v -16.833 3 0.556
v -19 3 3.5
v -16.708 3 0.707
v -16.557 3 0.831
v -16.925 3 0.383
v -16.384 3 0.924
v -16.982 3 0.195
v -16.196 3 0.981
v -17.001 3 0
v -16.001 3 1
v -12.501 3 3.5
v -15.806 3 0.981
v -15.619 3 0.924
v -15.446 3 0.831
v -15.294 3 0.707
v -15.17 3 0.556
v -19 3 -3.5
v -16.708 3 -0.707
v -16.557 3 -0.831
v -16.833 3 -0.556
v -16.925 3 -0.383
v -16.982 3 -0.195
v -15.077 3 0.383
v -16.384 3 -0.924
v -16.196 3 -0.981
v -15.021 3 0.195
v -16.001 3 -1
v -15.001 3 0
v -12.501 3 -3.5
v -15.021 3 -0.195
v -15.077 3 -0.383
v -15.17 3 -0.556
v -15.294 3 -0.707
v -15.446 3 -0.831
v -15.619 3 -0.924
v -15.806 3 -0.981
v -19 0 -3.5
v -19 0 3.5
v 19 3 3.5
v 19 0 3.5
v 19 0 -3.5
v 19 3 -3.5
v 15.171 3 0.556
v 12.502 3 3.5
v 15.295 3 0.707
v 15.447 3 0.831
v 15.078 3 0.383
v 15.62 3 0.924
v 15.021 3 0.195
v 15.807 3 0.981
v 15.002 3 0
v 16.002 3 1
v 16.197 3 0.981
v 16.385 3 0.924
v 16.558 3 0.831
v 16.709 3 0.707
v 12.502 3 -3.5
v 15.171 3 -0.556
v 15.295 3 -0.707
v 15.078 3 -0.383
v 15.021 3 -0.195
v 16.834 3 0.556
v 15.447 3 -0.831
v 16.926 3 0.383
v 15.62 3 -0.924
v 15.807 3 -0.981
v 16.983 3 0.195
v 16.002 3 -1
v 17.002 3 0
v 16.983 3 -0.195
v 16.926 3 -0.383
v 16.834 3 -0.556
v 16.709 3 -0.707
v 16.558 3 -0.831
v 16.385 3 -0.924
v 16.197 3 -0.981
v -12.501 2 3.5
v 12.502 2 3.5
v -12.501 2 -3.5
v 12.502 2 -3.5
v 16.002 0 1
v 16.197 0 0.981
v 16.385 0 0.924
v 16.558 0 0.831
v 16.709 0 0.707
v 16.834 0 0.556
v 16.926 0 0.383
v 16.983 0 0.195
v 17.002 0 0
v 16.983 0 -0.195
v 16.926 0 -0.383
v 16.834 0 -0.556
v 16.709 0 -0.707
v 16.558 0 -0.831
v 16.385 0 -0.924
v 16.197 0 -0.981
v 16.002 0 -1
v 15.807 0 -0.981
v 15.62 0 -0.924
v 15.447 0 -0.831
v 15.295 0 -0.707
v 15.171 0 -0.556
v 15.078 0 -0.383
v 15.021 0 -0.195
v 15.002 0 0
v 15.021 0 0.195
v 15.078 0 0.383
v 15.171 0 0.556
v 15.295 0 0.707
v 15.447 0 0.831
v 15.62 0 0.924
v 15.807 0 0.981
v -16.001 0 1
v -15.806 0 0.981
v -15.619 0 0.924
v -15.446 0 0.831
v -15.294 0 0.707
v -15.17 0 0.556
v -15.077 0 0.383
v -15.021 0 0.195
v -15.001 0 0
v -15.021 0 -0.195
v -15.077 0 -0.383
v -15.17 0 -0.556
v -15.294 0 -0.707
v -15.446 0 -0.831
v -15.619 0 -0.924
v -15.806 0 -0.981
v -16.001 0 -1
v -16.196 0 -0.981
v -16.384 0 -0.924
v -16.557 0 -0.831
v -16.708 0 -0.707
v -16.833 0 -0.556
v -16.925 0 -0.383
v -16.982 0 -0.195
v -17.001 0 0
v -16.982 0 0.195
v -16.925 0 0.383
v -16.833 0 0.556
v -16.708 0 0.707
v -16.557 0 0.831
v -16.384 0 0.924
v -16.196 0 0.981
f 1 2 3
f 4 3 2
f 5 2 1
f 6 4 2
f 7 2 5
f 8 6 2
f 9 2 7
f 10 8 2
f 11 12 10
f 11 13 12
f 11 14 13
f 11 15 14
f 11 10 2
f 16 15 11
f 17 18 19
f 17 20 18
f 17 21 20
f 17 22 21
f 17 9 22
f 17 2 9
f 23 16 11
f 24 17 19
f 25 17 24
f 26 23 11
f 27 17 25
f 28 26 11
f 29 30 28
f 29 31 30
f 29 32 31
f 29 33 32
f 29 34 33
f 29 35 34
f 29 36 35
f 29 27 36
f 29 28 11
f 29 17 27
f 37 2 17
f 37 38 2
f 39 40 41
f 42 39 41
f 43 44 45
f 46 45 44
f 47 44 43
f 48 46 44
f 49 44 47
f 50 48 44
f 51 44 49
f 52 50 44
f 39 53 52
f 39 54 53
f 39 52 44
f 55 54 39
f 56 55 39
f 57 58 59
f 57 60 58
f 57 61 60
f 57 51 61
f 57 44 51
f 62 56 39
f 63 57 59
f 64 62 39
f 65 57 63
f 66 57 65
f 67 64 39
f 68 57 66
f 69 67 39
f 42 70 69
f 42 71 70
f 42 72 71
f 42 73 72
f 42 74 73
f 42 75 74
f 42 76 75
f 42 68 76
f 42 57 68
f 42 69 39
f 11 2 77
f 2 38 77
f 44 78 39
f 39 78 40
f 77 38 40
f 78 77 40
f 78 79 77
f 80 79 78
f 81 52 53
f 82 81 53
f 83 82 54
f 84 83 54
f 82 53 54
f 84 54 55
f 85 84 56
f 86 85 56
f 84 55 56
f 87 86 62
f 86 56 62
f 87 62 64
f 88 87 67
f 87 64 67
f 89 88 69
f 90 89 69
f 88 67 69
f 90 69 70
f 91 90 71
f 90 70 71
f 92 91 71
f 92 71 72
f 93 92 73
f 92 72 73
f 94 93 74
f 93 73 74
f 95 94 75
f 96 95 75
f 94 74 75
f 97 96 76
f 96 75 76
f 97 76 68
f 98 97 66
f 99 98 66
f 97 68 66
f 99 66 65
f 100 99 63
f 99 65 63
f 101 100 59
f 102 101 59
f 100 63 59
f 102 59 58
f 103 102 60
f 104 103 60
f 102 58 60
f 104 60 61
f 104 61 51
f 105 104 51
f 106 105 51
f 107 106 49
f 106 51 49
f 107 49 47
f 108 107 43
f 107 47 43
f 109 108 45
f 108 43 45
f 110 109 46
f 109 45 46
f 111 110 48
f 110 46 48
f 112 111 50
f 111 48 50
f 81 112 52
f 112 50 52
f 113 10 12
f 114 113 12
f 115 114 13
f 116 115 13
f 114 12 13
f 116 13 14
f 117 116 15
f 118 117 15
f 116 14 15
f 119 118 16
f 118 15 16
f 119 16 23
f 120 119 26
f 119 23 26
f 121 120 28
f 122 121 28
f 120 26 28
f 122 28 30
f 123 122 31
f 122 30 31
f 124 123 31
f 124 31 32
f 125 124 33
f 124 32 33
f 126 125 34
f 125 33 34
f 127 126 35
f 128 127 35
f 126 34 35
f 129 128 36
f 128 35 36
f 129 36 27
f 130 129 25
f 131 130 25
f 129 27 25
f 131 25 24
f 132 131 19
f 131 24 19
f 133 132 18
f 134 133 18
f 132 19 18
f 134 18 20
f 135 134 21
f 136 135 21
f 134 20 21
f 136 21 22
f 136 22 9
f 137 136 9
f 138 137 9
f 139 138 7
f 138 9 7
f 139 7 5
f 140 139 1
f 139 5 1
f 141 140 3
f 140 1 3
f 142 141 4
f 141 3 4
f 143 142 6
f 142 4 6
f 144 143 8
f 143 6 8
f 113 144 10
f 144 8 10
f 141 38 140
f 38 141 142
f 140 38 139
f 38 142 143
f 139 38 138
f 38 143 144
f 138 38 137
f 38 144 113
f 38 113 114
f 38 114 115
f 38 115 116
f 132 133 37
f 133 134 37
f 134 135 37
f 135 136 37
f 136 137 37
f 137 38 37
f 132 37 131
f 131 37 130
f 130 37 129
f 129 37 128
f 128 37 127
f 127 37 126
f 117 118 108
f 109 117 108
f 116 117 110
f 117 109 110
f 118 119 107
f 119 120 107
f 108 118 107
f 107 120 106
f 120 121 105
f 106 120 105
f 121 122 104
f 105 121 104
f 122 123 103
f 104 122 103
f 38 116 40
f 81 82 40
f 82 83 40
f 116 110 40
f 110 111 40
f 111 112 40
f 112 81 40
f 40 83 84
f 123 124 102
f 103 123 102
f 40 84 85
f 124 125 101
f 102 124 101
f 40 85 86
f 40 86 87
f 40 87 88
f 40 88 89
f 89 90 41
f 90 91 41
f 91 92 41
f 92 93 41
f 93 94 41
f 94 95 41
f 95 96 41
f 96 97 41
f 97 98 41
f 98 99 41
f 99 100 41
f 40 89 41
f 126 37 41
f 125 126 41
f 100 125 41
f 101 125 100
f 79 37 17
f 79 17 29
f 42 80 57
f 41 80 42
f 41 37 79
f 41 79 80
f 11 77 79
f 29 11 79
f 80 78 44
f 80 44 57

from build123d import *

# Parameters (mm, degrees)
SKETCH1_W           = 38
SKETCH1_H           = 7
BOSS_EXTRUDE1_DEPTH = 2
SKETCH2_W           = 6.498713404
SKETCH2_H           = 7
SKETCH2_W_2         = 6.49777259
BOSS_EXTRUDE2_DEPTH = 1
SKETCH3_R           = 1
CUT_EXTRUDE1_DEPTH  = 3


with BuildPart() as part:
    # Sketch1 → Boss-Extrude1 (new body)
    with BuildSketch(Plane(origin=(0, 0, 0), x_dir=(1, 0, 0), z_dir=(0, 1, 0))):
        Rectangle(SKETCH1_W, SKETCH1_H)
    extrude(amount=BOSS_EXTRUDE1_DEPTH)

    # Sketch2 → Boss-Extrude2 (add)
    with BuildSketch(Plane(origin=(0, 2, 0), x_dir=(1, 0, 0), z_dir=(0, 1, 0))):
        with Locations((-15.750643298, 0)):
            Rectangle(SKETCH2_W, SKETCH2_H)
        with Locations((15.751113705, 0)):
            Rectangle(SKETCH2_W_2, SKETCH2_H)
    extrude(amount=BOSS_EXTRUDE2_DEPTH)

    # Sketch3 → Cut-Extrude1 (cut)
    with BuildSketch(Plane(origin=(0, 3, 0), x_dir=(1, 0, 0), z_dir=(0, 1, 0))):
        with Locations(Location((-16.001286596, 0, 0), (0, 0, 270))):
            Circle(SKETCH3_R)
        with Locations(Location((16.00222741, 0, 0), (0, 0, 270))):
            Circle(SKETCH3_R)
    extrude(amount=-CUT_EXTRUDE1_DEPTH, mode=Mode.SUBTRACT)


solid = part.part
